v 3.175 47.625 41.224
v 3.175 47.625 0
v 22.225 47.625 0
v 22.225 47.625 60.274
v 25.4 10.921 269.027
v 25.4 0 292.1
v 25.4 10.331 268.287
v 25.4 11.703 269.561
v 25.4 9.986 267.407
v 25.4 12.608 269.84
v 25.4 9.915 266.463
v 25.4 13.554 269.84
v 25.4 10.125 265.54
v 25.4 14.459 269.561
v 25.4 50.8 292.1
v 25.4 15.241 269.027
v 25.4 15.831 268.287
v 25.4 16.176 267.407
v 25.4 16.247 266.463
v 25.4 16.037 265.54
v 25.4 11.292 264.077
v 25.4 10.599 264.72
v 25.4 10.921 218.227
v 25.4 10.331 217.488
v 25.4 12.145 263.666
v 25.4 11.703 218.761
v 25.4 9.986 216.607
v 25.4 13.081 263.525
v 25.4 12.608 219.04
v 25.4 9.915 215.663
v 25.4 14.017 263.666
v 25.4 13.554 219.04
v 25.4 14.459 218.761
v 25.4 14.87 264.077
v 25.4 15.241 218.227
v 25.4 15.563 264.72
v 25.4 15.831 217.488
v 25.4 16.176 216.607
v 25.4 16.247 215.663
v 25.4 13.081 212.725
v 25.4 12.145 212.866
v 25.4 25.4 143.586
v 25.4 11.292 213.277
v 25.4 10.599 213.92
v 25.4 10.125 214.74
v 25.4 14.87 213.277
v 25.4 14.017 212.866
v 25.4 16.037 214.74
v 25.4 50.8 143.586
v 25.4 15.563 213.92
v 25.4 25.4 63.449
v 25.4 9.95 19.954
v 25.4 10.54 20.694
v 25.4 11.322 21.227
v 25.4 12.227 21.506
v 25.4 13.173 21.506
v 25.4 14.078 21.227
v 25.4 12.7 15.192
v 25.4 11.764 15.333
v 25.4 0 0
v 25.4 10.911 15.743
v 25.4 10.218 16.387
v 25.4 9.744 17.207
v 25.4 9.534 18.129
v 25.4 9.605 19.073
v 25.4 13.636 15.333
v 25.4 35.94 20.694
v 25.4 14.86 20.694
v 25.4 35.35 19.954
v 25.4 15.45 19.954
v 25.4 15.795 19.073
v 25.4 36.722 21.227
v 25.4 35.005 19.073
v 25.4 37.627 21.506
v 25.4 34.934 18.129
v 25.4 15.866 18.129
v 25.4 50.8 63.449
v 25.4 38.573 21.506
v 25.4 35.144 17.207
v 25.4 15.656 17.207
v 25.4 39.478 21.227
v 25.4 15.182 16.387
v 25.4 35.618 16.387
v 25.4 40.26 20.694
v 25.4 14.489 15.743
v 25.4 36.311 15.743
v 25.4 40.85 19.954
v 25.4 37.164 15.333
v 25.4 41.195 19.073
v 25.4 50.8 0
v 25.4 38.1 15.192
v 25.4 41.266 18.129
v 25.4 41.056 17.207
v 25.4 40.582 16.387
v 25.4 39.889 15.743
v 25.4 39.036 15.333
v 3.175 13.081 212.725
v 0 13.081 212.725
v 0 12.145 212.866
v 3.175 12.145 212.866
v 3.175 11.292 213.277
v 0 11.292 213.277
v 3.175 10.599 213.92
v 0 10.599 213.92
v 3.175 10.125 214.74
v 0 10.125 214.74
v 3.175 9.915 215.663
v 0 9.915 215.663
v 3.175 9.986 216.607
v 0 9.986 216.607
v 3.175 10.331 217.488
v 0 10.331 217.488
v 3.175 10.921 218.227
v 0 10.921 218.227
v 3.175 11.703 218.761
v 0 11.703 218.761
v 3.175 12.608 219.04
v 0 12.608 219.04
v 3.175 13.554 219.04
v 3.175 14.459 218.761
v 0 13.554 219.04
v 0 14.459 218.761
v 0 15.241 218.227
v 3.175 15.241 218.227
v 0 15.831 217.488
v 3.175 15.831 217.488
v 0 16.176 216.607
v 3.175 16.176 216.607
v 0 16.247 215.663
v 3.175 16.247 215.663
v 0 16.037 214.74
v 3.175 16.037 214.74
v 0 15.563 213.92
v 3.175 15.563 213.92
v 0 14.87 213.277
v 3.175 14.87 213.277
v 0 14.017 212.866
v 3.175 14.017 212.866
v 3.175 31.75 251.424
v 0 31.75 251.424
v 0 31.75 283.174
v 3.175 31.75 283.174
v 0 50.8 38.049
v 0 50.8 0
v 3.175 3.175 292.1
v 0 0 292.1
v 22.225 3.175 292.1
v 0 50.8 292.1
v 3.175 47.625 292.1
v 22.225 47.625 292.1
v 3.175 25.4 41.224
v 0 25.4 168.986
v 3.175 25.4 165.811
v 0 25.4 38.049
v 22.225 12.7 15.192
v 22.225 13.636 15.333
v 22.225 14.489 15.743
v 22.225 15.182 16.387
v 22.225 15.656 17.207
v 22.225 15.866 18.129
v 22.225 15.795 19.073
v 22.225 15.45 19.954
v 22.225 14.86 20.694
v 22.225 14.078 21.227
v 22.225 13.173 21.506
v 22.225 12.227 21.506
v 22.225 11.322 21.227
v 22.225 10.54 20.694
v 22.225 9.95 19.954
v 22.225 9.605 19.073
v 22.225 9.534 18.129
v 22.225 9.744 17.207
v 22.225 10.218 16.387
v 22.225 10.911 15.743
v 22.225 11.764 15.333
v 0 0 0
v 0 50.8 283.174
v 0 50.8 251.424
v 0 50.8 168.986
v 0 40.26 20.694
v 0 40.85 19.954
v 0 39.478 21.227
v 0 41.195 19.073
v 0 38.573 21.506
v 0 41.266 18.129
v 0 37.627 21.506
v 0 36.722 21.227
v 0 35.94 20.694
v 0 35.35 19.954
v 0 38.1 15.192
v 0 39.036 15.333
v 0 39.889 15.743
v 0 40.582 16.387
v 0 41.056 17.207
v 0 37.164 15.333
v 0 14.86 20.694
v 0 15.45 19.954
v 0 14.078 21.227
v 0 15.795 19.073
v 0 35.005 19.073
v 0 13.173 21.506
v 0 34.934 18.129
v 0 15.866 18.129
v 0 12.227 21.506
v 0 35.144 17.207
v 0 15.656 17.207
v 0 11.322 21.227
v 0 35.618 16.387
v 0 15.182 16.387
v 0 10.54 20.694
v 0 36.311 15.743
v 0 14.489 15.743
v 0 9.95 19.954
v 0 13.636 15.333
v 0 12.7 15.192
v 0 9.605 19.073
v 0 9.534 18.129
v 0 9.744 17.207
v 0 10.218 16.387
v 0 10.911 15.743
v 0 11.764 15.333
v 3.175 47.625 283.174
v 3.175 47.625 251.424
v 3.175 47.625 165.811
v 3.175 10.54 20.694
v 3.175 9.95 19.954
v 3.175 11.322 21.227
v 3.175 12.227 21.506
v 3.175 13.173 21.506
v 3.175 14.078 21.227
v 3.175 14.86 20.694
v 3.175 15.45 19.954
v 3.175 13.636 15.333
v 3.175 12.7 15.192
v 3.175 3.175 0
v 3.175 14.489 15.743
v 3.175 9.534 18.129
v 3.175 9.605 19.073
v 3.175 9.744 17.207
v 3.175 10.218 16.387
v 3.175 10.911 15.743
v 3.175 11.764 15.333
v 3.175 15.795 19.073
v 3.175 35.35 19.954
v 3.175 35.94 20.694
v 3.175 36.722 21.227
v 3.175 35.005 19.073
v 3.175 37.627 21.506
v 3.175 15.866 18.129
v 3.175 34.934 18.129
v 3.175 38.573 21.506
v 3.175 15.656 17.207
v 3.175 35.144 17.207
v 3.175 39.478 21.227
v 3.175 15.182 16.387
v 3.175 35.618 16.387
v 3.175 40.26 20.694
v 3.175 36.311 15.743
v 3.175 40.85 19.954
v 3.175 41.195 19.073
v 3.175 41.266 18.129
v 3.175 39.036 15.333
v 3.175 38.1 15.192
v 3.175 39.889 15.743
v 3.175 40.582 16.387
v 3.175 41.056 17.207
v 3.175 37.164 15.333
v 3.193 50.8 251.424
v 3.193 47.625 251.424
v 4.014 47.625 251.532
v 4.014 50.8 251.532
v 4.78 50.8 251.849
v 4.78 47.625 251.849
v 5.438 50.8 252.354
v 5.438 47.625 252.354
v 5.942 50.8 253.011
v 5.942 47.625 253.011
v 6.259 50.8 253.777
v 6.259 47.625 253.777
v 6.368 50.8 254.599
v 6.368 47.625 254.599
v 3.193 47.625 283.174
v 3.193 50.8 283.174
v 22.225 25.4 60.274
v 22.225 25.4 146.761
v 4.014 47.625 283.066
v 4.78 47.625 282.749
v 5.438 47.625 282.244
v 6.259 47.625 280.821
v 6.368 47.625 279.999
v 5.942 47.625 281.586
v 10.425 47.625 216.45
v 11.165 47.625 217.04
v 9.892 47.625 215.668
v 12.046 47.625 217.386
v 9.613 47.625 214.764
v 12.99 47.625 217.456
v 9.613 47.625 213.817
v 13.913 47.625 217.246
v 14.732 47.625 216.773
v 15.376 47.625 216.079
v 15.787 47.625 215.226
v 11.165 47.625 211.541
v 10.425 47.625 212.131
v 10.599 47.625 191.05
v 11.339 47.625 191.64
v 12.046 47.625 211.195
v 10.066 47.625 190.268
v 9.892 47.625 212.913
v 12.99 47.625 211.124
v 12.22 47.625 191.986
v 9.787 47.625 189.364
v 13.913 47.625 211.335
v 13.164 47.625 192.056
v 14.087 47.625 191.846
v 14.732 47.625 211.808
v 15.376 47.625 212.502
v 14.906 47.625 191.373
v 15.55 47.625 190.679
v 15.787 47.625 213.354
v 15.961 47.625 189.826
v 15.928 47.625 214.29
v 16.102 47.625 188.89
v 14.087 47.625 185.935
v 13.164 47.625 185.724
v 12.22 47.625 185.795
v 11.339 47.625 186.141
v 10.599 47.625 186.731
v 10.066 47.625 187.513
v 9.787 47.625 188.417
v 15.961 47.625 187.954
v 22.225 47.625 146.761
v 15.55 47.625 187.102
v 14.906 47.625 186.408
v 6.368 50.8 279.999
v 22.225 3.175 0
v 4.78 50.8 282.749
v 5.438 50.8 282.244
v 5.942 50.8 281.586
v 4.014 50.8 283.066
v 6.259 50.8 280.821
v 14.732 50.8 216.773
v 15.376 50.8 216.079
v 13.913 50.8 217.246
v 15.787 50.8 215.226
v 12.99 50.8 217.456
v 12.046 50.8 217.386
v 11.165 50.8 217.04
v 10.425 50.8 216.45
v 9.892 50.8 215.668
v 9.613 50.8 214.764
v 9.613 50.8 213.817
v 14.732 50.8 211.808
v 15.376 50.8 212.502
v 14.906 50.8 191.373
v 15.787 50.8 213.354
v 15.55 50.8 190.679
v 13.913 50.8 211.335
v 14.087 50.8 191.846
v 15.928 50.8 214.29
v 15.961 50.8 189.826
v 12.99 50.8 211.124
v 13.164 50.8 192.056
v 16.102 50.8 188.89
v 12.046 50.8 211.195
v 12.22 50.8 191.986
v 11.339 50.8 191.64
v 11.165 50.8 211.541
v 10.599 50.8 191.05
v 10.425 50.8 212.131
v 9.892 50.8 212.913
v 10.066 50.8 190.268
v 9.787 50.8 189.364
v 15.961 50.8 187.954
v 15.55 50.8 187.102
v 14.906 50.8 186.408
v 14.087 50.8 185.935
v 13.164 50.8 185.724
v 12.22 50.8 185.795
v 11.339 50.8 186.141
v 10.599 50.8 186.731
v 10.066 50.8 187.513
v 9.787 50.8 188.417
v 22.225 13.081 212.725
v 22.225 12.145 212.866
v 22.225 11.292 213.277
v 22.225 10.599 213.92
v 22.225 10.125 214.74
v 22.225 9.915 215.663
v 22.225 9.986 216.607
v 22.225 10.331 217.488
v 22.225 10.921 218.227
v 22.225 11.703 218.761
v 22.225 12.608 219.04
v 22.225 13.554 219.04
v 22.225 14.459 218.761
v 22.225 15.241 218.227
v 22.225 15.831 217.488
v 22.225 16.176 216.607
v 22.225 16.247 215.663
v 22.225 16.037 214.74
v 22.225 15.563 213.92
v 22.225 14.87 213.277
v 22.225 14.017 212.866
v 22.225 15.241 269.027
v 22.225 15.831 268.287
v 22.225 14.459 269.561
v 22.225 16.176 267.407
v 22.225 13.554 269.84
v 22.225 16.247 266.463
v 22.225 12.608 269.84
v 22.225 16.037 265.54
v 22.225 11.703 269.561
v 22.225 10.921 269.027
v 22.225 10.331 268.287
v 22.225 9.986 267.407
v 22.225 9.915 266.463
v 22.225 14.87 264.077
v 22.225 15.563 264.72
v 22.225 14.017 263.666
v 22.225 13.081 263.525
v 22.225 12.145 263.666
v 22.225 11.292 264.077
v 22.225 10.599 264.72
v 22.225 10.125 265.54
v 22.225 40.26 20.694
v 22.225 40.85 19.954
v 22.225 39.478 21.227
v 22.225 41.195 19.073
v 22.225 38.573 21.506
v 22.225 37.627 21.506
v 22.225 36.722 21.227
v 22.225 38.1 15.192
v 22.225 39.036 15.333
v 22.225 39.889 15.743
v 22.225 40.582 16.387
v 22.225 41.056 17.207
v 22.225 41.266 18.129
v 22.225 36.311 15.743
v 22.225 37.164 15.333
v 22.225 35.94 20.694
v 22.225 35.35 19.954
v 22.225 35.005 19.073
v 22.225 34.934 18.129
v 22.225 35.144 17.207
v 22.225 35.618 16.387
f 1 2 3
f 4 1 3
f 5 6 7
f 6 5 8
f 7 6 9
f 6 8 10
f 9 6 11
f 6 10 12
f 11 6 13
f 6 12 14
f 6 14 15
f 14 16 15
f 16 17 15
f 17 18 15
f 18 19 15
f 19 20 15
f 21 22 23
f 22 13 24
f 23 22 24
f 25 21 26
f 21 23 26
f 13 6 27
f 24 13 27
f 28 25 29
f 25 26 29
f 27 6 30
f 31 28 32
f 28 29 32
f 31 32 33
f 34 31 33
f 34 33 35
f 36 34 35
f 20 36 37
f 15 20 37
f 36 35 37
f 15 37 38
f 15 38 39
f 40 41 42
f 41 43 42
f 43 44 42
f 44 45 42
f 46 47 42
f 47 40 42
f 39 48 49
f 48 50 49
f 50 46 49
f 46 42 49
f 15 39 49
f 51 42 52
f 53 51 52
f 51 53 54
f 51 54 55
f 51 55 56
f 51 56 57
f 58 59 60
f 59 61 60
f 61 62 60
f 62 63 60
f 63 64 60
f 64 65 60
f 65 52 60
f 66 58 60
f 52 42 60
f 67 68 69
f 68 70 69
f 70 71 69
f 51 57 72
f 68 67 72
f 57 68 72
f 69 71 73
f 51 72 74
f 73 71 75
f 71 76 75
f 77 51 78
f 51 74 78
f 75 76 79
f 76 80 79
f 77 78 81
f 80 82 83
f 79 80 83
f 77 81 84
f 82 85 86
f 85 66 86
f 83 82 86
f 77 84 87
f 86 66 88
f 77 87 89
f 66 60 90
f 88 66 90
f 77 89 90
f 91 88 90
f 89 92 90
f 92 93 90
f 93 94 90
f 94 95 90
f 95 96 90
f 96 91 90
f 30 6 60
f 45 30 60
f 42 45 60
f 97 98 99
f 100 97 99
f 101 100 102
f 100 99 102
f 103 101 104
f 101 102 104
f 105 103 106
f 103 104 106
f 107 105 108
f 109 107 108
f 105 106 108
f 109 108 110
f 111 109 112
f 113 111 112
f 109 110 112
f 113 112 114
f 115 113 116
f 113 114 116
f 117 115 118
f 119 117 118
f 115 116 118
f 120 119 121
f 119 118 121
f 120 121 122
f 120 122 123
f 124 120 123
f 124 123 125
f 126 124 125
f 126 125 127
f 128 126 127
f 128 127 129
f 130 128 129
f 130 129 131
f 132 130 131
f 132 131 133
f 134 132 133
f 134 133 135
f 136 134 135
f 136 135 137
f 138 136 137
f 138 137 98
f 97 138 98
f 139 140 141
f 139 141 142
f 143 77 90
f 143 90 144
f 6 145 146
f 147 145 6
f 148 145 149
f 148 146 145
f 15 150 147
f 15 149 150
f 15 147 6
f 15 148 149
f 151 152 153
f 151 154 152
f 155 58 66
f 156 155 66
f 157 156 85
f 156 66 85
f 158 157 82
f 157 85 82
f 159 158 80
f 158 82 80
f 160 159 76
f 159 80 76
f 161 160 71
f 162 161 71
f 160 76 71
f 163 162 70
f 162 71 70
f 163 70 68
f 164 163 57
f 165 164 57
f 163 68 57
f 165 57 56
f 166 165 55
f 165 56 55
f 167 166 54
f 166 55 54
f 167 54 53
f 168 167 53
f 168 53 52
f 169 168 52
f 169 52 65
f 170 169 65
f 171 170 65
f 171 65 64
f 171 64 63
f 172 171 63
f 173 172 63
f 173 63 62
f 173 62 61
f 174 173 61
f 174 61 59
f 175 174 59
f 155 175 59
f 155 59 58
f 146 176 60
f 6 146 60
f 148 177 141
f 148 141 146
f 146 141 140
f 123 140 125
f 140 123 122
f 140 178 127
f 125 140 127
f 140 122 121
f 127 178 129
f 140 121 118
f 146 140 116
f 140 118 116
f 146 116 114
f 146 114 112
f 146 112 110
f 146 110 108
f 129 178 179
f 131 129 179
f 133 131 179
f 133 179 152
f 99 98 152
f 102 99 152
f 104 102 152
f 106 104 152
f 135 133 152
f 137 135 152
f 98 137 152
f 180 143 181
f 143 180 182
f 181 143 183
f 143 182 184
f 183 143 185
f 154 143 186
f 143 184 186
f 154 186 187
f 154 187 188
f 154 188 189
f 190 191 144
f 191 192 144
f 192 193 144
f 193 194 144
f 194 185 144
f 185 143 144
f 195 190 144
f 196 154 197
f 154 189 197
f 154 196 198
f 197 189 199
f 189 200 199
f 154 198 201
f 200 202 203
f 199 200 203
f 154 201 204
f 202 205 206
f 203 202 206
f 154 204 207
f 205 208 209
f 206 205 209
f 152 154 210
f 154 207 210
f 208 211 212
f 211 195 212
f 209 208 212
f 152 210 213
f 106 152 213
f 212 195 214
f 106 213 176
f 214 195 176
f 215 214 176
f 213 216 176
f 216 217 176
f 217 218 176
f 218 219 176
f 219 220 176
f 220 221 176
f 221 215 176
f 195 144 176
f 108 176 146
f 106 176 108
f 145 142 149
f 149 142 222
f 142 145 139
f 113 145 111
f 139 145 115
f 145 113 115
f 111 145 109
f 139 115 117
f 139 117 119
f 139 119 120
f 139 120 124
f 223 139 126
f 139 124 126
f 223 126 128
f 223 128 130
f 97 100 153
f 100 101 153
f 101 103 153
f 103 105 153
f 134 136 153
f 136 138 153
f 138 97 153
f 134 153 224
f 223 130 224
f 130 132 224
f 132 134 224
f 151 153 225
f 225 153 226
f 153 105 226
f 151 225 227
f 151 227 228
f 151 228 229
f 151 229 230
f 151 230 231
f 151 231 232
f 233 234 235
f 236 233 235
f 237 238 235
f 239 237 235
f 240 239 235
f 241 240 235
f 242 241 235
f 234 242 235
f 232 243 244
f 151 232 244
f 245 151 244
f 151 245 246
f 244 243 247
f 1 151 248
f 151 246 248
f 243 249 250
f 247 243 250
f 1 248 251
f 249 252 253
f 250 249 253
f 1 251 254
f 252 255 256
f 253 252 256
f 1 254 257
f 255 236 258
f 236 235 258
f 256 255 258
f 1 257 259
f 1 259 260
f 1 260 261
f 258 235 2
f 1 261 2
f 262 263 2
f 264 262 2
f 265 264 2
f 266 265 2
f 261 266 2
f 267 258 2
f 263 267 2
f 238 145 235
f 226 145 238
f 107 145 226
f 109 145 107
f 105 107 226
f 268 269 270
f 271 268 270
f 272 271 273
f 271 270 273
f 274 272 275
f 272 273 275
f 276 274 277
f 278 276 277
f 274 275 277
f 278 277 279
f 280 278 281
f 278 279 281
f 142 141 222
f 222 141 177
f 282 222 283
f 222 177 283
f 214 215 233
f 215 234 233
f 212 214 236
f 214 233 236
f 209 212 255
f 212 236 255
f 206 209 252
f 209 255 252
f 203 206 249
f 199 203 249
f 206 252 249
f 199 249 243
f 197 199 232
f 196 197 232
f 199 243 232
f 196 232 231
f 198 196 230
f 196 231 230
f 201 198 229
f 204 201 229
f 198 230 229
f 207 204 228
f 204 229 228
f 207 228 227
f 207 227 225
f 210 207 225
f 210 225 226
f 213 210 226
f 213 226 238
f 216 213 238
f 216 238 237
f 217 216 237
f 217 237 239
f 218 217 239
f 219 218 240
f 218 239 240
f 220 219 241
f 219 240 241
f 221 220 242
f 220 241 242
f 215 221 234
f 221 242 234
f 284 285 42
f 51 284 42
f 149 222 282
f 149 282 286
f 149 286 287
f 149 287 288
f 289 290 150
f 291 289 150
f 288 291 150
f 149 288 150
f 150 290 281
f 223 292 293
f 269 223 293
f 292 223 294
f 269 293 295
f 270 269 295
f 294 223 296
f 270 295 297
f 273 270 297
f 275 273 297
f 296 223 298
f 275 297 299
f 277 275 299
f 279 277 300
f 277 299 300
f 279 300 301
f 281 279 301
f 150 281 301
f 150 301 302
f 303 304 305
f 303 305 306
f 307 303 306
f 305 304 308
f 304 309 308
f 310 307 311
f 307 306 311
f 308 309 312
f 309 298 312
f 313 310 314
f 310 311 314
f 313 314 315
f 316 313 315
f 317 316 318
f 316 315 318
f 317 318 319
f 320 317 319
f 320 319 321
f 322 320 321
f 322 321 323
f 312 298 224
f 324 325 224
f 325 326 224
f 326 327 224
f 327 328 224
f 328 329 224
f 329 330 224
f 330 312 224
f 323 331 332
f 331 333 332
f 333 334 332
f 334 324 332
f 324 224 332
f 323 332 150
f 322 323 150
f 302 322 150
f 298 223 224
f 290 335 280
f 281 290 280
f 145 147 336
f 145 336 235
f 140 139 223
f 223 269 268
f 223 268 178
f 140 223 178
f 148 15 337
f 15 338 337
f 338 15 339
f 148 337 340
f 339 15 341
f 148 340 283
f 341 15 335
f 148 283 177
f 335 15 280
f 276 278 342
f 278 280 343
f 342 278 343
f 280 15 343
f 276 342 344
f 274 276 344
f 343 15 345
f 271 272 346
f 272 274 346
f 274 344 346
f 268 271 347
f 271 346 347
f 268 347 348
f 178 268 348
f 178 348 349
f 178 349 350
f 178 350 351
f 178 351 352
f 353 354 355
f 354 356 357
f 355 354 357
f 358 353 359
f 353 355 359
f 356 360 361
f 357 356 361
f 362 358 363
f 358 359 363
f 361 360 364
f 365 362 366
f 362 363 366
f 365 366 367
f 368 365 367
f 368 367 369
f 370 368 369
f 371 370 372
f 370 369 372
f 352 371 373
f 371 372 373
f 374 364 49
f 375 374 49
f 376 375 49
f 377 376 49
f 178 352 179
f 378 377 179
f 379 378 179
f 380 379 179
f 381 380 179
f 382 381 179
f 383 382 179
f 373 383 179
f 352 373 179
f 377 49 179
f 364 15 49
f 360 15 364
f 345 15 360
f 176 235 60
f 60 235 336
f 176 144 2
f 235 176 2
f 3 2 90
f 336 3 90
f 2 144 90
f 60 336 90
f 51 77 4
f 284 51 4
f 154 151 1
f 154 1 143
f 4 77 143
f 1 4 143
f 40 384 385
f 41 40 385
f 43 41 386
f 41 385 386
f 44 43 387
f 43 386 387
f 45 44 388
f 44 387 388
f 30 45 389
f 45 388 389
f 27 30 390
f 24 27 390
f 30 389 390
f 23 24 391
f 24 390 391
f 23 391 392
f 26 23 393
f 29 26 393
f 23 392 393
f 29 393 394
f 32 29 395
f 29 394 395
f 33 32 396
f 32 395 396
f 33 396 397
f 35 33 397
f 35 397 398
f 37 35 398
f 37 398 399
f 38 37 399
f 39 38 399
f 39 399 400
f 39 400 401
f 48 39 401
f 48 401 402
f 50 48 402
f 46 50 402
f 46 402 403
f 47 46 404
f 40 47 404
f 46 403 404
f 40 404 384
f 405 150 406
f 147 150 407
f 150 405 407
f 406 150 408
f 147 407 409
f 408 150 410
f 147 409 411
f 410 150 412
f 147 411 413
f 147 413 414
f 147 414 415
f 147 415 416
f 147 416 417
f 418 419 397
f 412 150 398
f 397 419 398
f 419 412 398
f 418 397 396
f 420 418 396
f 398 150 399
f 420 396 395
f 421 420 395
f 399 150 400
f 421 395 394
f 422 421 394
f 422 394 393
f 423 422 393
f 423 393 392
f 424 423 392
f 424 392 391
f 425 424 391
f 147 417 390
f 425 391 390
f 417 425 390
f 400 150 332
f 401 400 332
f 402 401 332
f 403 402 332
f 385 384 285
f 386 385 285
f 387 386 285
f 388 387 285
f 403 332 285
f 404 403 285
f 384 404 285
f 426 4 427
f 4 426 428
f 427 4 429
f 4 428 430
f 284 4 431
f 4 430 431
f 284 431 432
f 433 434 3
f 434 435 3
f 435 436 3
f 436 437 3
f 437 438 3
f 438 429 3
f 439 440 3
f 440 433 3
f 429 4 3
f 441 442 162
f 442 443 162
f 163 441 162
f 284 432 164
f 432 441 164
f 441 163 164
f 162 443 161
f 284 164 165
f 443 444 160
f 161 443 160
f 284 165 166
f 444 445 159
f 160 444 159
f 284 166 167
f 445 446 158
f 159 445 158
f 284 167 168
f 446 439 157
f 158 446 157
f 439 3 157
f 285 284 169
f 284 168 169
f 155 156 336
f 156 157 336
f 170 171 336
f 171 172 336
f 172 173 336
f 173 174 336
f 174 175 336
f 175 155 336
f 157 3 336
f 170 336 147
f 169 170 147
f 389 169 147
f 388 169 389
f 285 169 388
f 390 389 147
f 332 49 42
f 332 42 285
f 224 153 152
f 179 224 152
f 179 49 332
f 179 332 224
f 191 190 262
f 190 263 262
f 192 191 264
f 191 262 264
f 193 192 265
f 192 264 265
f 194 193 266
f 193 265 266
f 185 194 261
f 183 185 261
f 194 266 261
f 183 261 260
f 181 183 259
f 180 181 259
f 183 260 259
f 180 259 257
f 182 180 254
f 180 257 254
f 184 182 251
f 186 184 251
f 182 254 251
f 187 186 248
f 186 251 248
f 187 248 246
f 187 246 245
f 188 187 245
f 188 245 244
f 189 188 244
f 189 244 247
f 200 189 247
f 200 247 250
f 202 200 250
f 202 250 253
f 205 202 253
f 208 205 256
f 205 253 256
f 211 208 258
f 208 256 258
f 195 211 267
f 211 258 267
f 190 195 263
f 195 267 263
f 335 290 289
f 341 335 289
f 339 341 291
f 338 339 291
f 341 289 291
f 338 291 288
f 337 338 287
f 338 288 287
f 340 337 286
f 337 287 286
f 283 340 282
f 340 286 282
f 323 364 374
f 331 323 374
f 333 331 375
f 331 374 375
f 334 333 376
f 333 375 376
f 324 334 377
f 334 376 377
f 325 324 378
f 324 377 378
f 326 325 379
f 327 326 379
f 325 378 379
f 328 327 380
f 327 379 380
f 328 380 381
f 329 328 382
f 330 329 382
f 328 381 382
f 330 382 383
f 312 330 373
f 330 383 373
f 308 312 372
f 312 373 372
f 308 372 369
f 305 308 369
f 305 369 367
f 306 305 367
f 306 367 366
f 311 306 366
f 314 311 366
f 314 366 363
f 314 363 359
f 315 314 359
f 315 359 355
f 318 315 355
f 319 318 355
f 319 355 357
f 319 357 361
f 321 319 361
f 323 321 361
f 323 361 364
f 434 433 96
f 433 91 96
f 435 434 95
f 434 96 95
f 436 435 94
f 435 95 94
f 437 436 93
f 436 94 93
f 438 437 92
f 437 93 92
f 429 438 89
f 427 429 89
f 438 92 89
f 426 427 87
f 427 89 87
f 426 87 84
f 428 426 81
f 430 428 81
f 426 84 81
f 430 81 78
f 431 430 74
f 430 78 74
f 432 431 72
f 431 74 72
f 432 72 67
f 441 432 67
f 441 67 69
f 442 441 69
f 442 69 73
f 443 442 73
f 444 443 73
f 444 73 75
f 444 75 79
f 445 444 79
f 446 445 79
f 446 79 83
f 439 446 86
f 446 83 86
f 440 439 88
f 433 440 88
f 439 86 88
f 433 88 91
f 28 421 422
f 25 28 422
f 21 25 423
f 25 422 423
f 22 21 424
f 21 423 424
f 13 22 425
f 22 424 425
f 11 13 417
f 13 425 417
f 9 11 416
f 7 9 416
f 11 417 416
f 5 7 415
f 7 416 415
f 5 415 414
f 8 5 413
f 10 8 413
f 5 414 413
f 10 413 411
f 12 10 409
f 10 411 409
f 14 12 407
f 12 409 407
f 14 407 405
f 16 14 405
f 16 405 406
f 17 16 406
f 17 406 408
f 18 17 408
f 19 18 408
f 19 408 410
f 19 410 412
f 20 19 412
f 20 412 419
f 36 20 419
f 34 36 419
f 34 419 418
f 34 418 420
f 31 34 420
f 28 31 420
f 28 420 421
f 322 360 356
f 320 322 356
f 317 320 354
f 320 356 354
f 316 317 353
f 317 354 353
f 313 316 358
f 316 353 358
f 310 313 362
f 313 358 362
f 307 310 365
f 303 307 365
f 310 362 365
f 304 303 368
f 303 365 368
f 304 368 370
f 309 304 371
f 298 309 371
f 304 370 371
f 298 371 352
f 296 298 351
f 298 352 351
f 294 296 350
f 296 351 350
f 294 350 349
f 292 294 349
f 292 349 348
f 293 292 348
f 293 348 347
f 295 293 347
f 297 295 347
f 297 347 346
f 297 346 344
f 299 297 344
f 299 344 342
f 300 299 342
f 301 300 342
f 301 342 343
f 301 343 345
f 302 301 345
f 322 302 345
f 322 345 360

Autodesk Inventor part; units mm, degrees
ref_plane "YZ Plane" through (0, 0, 0) normal (1, 0, 0) x (0, 1, 0)
ref_plane "XZ Plane" through (0, 0, 0) normal (0, 1, 0) x (-1, 0, 0)
ref_plane "XY Plane" through (0, 0, 0) normal (0, 0, 1) x (1, 0, 0)
sketch "Sketch1" plane through (0, 0, 0) normal (0, 0, 1) x (1, 0, 0)
  line L0 (0, 0) -> (25.4, 0)
  line L1 (25.4, 0) -> (25.4, 50.8)
  line L2 (25.4, 50.8) -> (0, 50.8)
  line L3 (0, 50.8) -> (0, 0)
  line L4 (3.175, 47.625) -> (22.225, 47.625)
  line L5 (22.225, 47.625) -> (22.225, 3.175)
  line L6 (22.225, 3.175) -> (3.175, 3.175)
  line L7 (3.175, 3.175) -> (3.175, 47.625)
  dimension "d0" = 25.4
  dimension "d1" = 50.8
  dimension "d2" = 3.175
extrude "Extrusion1" add sketch "Sketch1" along normal blind 292.1
sketch "Sketch2" plane through (0, 50.8, 0) normal (0, 1, 0) x (1, 0, 0)
  line L0 (25.4, 0) -> (25.4, -292.1) projected
  line L1 (0, 0) -> (0, -292.1) projected
  line L2 (25.4, -63.4492) -> (0, -38.0492)
  line L3 (25.4, -143.5862) -> (0, -168.9862)
  line L4 (0, -168.9862) -> (0, -38.0492)
  line L5 (25.4, -143.5862) -> (25.4, -63.4492)
extrude "Extrusion2" cut sketch "Sketch2" against normal blind 25.4
sketch "Sketch3" plane through (25.4, 0, 0) normal (1, 0, 0) x (0, 0, -1)
  line L0 (-15.2442, 1673.225) -> (-15.2442, -149.225) projected
  line L1 (17.7758, 1673.225) -> (17.7758, -149.225) projected
  circle A0 centre (-215.7344, 12.9914) radius 3.175 projected
  circle A1 centre (-14.559, 38.1) radius 3.175 projected
  circle A2 centre (-14.559, 12.7) radius 3.175 projected
  line L2 (-34.8742, 50.8) -> (-34.8742, 25.4) projected
  line L3 (-34.8742, 25.4) -> (-169.9072, 25.4) projected
  line L4 (-169.9072, 25.4) -> (-169.9072, 50.8) projected
  line L5 (-169.9072, 50.8) -> (-234.7144, 50.8) projected
  line L6 (-234.7144, 50.8) -> (-234.7144, 0) projected
  line L7 (0, 0) -> (-234.7144, 0) projected
  line L8 (0, 50.8) -> (0, 0) projected
  line L9 (0, 50.8) -> (-34.8742, 50.8) projected
  line L10 (0, 0) -> (-292.1, 0) projected
  line L11 (-34.8742, 50.8) -> (17.7758, 50.8)
  line L12 (17.7758, 50.8) -> (17.7758, 0)
  line L13 (17.7758, 0) -> (-34.8742, 0)
  line L14 (-34.8742, 0) -> (-34.8742, 50.8)
  circle A3 centre (-18.3666, 38.1) radius 3.175
  circle A4 centre (-18.3666, 12.7) radius 3.175
  dimension "d7" = 6.35
  dimension "d8" = 6.35
extrude "Extrusion3" cut sketch "Sketch3" against normal blind 25.4 contours A3 L0 | L0 A3 A1 | A1 A3 | A4 L0 | L0 A4 A2 | A2 A4 picked at (-16.0741, 38.1) picked at (-16.0741, 12.7)
sketch "Sketch4" plane through (0, 50.8, 292.1) normal (0, 1, 0) x (1, 0, 0)
  circle A0 centre (12.7528, 77.8097) radius 3.175 projected
  circle A1 centre (-65.5643, -12.7) radius 3.175 projected
  circle A2 centre (16.4357, -12.7) radius 3.175 projected
  circle A3 centre (-65.5643, 77.8097) radius 3.175 projected
  line L0 (-75.3643, -25.3975) -> (26.2357, -25.3975) projected
  line L1 (26.2357, 88.0643) -> (26.2357, -25.3975) projected
  line L2 (26.2357, 88.0643) -> (-75.3643, 88.0643) projected
  line L3 (-75.3643, 88.0643) -> (-75.3643, -25.3975) projected
  circle A4 centre (-24.5643, 24.5643) radius 41 projected
  circle A5 centre (-24.6714, 70.0642) radius 2.55 projected
  circle A6 centre (-70.0642, 24.4572) radius 2.55 projected
  circle A7 centre (-24.4572, -20.9355) radius 2.55 projected
  circle A8 centre (20.9355, 24.6714) radius 2.55 projected
  circle A9 centre (7.5332, 56.8133) radius 2.55 projected
  circle A10 centre (7.6847, -7.5332) radius 2.55 projected
  circle A11 centre (-56.6619, -7.6847) radius 2.55 projected
  circle A12 centre (-56.8133, 56.6619) radius 2.55 projected
  circle A13 centre (-65.5643, 77.8097) radius 3.175 projected
  circle A14 centre (-65.5643, -12.7) radius 3.175 projected
  circle A15 centre (16.4357, -12.7) radius 3.175 projected
  circle A16 centre (-24.5643, 24.5643) radius 9.525 projected
  circle A17 centre (12.9268, 103.2097) radius 3.175 projected
  circle A18 centre (-78.1301, -12.7) radius 3.175 projected
  circle A19 centre (12.7528, 77.8097) radius 3.175 projected
  line L4 (25.4, -25.4) -> (-88.9, -25.4) projected
  line L5 (25.4, 123.9554) -> (25.4, -25.4) projected
  line L6 (25.4, 123.9554) -> (-88.9, 92.2721) projected
  line L7 (-88.9, -25.4) -> (-88.9, 92.2721) projected
  point P0 (0, 292.1)
extrude "Extrusion4" cut sketch "Sketch4" against normal blind 25.4 contours A0 | A17
sketch "Sketch5" plane through (25.4, 0, 0) normal (1, 0, 0) x (0, 0, -1)
  line L0 (-292.1, 0) -> (-292.1, 50.8) projected
  line L1 (0, 0) -> (-292.1, 0) projected
  point P0 (-266.7, 13.081)
  point P1 (-215.9, 13.081)
  dimension "d13" = 25.4
  dimension "d14" = 50.8
  dimension "d15" = 13.081
  dimension "d16" = 13.081
hole "Hole1" at (25.4, 13.081, 266.7) at (25.4, 13.081, 215.9) direction (-1, 0, 0) diameter 6.35 end through all
sketch "Sketch6" plane through (0, 0, 0) normal (0, -1, 0) x (1, 0, 0)
  circle A0 centre (-24.5643, 267.5357) radius 28.3845 projected
  point P0 (0, 0)
extrude "Extrusion5" cut sketch "Sketch6" against normal blind 50.8
sketch "Sketch7" plane through (0, 50.8, 292.1) normal (0, 1, 0) x (1, 0, 0)
  line L0 (0, 10.3421) -> (0, 0) projected
  line L1 (0, 8.9261) -> (6.3676, 8.9261)
  line L2 (6.3676, 8.9261) -> (6.3676, 40.6761)
  line L3 (6.3676, 40.6761) -> (0, 40.6761)
  line L4 (0, 40.6761) -> (0, 8.9261)
  point P0 (0, 292.1)
  dimension "d26" = 31.75
extrude "Extrusion6" cut sketch "Sketch7" against normal blind 19.05
fillet "Fillet1" radius 3.175 1 edges at (6.3676, 49.2125, 251.4239)
fillet "Fillet2" radius 3.175 1 edges at (6.3676, 49.2125, 283.1739)
sketch "Sketch8" plane through (0, 0, 0) normal (0, -1, 0) x (1, 0, 0)
  line L0 (0, 283.1739) -> (0, 292.1) projected
  line L1 (3.175, 165.8112) -> (3.175, 251.4239) projected
  line L2 (0, 284.5553) -> (3.175, 284.5553)
  line L3 (3.175, 284.5553) -> (3.175, 247.1802)
  line L4 (3.175, 247.1802) -> (0, 247.1802)
  line L5 (0, 247.1802) -> (0, 284.5553)
  point P0 (0, 0)
extrude "Extrusion7" add sketch "Sketch8" against normal blind 31.75
sketch "Sketch9" plane through (0, 0, 0) normal (0, -1, 0) x (1, 0, 0)
  line L0 (1.5802, 280.6086) -> (8.0596, 280.6086)
  line L1 (8.0596, 280.6086) -> (8.0596, 250.8034)
  line L2 (8.0596, 250.8034) -> (1.5802, 250.8034)
  line L3 (1.5802, 250.8034) -> (1.5802, 280.6086)
  point P0 (0, 0)
extrude "Extrusion8" add sketch "Sketch9" against normal blind 3.175
properties part number "Fender Side Right"
